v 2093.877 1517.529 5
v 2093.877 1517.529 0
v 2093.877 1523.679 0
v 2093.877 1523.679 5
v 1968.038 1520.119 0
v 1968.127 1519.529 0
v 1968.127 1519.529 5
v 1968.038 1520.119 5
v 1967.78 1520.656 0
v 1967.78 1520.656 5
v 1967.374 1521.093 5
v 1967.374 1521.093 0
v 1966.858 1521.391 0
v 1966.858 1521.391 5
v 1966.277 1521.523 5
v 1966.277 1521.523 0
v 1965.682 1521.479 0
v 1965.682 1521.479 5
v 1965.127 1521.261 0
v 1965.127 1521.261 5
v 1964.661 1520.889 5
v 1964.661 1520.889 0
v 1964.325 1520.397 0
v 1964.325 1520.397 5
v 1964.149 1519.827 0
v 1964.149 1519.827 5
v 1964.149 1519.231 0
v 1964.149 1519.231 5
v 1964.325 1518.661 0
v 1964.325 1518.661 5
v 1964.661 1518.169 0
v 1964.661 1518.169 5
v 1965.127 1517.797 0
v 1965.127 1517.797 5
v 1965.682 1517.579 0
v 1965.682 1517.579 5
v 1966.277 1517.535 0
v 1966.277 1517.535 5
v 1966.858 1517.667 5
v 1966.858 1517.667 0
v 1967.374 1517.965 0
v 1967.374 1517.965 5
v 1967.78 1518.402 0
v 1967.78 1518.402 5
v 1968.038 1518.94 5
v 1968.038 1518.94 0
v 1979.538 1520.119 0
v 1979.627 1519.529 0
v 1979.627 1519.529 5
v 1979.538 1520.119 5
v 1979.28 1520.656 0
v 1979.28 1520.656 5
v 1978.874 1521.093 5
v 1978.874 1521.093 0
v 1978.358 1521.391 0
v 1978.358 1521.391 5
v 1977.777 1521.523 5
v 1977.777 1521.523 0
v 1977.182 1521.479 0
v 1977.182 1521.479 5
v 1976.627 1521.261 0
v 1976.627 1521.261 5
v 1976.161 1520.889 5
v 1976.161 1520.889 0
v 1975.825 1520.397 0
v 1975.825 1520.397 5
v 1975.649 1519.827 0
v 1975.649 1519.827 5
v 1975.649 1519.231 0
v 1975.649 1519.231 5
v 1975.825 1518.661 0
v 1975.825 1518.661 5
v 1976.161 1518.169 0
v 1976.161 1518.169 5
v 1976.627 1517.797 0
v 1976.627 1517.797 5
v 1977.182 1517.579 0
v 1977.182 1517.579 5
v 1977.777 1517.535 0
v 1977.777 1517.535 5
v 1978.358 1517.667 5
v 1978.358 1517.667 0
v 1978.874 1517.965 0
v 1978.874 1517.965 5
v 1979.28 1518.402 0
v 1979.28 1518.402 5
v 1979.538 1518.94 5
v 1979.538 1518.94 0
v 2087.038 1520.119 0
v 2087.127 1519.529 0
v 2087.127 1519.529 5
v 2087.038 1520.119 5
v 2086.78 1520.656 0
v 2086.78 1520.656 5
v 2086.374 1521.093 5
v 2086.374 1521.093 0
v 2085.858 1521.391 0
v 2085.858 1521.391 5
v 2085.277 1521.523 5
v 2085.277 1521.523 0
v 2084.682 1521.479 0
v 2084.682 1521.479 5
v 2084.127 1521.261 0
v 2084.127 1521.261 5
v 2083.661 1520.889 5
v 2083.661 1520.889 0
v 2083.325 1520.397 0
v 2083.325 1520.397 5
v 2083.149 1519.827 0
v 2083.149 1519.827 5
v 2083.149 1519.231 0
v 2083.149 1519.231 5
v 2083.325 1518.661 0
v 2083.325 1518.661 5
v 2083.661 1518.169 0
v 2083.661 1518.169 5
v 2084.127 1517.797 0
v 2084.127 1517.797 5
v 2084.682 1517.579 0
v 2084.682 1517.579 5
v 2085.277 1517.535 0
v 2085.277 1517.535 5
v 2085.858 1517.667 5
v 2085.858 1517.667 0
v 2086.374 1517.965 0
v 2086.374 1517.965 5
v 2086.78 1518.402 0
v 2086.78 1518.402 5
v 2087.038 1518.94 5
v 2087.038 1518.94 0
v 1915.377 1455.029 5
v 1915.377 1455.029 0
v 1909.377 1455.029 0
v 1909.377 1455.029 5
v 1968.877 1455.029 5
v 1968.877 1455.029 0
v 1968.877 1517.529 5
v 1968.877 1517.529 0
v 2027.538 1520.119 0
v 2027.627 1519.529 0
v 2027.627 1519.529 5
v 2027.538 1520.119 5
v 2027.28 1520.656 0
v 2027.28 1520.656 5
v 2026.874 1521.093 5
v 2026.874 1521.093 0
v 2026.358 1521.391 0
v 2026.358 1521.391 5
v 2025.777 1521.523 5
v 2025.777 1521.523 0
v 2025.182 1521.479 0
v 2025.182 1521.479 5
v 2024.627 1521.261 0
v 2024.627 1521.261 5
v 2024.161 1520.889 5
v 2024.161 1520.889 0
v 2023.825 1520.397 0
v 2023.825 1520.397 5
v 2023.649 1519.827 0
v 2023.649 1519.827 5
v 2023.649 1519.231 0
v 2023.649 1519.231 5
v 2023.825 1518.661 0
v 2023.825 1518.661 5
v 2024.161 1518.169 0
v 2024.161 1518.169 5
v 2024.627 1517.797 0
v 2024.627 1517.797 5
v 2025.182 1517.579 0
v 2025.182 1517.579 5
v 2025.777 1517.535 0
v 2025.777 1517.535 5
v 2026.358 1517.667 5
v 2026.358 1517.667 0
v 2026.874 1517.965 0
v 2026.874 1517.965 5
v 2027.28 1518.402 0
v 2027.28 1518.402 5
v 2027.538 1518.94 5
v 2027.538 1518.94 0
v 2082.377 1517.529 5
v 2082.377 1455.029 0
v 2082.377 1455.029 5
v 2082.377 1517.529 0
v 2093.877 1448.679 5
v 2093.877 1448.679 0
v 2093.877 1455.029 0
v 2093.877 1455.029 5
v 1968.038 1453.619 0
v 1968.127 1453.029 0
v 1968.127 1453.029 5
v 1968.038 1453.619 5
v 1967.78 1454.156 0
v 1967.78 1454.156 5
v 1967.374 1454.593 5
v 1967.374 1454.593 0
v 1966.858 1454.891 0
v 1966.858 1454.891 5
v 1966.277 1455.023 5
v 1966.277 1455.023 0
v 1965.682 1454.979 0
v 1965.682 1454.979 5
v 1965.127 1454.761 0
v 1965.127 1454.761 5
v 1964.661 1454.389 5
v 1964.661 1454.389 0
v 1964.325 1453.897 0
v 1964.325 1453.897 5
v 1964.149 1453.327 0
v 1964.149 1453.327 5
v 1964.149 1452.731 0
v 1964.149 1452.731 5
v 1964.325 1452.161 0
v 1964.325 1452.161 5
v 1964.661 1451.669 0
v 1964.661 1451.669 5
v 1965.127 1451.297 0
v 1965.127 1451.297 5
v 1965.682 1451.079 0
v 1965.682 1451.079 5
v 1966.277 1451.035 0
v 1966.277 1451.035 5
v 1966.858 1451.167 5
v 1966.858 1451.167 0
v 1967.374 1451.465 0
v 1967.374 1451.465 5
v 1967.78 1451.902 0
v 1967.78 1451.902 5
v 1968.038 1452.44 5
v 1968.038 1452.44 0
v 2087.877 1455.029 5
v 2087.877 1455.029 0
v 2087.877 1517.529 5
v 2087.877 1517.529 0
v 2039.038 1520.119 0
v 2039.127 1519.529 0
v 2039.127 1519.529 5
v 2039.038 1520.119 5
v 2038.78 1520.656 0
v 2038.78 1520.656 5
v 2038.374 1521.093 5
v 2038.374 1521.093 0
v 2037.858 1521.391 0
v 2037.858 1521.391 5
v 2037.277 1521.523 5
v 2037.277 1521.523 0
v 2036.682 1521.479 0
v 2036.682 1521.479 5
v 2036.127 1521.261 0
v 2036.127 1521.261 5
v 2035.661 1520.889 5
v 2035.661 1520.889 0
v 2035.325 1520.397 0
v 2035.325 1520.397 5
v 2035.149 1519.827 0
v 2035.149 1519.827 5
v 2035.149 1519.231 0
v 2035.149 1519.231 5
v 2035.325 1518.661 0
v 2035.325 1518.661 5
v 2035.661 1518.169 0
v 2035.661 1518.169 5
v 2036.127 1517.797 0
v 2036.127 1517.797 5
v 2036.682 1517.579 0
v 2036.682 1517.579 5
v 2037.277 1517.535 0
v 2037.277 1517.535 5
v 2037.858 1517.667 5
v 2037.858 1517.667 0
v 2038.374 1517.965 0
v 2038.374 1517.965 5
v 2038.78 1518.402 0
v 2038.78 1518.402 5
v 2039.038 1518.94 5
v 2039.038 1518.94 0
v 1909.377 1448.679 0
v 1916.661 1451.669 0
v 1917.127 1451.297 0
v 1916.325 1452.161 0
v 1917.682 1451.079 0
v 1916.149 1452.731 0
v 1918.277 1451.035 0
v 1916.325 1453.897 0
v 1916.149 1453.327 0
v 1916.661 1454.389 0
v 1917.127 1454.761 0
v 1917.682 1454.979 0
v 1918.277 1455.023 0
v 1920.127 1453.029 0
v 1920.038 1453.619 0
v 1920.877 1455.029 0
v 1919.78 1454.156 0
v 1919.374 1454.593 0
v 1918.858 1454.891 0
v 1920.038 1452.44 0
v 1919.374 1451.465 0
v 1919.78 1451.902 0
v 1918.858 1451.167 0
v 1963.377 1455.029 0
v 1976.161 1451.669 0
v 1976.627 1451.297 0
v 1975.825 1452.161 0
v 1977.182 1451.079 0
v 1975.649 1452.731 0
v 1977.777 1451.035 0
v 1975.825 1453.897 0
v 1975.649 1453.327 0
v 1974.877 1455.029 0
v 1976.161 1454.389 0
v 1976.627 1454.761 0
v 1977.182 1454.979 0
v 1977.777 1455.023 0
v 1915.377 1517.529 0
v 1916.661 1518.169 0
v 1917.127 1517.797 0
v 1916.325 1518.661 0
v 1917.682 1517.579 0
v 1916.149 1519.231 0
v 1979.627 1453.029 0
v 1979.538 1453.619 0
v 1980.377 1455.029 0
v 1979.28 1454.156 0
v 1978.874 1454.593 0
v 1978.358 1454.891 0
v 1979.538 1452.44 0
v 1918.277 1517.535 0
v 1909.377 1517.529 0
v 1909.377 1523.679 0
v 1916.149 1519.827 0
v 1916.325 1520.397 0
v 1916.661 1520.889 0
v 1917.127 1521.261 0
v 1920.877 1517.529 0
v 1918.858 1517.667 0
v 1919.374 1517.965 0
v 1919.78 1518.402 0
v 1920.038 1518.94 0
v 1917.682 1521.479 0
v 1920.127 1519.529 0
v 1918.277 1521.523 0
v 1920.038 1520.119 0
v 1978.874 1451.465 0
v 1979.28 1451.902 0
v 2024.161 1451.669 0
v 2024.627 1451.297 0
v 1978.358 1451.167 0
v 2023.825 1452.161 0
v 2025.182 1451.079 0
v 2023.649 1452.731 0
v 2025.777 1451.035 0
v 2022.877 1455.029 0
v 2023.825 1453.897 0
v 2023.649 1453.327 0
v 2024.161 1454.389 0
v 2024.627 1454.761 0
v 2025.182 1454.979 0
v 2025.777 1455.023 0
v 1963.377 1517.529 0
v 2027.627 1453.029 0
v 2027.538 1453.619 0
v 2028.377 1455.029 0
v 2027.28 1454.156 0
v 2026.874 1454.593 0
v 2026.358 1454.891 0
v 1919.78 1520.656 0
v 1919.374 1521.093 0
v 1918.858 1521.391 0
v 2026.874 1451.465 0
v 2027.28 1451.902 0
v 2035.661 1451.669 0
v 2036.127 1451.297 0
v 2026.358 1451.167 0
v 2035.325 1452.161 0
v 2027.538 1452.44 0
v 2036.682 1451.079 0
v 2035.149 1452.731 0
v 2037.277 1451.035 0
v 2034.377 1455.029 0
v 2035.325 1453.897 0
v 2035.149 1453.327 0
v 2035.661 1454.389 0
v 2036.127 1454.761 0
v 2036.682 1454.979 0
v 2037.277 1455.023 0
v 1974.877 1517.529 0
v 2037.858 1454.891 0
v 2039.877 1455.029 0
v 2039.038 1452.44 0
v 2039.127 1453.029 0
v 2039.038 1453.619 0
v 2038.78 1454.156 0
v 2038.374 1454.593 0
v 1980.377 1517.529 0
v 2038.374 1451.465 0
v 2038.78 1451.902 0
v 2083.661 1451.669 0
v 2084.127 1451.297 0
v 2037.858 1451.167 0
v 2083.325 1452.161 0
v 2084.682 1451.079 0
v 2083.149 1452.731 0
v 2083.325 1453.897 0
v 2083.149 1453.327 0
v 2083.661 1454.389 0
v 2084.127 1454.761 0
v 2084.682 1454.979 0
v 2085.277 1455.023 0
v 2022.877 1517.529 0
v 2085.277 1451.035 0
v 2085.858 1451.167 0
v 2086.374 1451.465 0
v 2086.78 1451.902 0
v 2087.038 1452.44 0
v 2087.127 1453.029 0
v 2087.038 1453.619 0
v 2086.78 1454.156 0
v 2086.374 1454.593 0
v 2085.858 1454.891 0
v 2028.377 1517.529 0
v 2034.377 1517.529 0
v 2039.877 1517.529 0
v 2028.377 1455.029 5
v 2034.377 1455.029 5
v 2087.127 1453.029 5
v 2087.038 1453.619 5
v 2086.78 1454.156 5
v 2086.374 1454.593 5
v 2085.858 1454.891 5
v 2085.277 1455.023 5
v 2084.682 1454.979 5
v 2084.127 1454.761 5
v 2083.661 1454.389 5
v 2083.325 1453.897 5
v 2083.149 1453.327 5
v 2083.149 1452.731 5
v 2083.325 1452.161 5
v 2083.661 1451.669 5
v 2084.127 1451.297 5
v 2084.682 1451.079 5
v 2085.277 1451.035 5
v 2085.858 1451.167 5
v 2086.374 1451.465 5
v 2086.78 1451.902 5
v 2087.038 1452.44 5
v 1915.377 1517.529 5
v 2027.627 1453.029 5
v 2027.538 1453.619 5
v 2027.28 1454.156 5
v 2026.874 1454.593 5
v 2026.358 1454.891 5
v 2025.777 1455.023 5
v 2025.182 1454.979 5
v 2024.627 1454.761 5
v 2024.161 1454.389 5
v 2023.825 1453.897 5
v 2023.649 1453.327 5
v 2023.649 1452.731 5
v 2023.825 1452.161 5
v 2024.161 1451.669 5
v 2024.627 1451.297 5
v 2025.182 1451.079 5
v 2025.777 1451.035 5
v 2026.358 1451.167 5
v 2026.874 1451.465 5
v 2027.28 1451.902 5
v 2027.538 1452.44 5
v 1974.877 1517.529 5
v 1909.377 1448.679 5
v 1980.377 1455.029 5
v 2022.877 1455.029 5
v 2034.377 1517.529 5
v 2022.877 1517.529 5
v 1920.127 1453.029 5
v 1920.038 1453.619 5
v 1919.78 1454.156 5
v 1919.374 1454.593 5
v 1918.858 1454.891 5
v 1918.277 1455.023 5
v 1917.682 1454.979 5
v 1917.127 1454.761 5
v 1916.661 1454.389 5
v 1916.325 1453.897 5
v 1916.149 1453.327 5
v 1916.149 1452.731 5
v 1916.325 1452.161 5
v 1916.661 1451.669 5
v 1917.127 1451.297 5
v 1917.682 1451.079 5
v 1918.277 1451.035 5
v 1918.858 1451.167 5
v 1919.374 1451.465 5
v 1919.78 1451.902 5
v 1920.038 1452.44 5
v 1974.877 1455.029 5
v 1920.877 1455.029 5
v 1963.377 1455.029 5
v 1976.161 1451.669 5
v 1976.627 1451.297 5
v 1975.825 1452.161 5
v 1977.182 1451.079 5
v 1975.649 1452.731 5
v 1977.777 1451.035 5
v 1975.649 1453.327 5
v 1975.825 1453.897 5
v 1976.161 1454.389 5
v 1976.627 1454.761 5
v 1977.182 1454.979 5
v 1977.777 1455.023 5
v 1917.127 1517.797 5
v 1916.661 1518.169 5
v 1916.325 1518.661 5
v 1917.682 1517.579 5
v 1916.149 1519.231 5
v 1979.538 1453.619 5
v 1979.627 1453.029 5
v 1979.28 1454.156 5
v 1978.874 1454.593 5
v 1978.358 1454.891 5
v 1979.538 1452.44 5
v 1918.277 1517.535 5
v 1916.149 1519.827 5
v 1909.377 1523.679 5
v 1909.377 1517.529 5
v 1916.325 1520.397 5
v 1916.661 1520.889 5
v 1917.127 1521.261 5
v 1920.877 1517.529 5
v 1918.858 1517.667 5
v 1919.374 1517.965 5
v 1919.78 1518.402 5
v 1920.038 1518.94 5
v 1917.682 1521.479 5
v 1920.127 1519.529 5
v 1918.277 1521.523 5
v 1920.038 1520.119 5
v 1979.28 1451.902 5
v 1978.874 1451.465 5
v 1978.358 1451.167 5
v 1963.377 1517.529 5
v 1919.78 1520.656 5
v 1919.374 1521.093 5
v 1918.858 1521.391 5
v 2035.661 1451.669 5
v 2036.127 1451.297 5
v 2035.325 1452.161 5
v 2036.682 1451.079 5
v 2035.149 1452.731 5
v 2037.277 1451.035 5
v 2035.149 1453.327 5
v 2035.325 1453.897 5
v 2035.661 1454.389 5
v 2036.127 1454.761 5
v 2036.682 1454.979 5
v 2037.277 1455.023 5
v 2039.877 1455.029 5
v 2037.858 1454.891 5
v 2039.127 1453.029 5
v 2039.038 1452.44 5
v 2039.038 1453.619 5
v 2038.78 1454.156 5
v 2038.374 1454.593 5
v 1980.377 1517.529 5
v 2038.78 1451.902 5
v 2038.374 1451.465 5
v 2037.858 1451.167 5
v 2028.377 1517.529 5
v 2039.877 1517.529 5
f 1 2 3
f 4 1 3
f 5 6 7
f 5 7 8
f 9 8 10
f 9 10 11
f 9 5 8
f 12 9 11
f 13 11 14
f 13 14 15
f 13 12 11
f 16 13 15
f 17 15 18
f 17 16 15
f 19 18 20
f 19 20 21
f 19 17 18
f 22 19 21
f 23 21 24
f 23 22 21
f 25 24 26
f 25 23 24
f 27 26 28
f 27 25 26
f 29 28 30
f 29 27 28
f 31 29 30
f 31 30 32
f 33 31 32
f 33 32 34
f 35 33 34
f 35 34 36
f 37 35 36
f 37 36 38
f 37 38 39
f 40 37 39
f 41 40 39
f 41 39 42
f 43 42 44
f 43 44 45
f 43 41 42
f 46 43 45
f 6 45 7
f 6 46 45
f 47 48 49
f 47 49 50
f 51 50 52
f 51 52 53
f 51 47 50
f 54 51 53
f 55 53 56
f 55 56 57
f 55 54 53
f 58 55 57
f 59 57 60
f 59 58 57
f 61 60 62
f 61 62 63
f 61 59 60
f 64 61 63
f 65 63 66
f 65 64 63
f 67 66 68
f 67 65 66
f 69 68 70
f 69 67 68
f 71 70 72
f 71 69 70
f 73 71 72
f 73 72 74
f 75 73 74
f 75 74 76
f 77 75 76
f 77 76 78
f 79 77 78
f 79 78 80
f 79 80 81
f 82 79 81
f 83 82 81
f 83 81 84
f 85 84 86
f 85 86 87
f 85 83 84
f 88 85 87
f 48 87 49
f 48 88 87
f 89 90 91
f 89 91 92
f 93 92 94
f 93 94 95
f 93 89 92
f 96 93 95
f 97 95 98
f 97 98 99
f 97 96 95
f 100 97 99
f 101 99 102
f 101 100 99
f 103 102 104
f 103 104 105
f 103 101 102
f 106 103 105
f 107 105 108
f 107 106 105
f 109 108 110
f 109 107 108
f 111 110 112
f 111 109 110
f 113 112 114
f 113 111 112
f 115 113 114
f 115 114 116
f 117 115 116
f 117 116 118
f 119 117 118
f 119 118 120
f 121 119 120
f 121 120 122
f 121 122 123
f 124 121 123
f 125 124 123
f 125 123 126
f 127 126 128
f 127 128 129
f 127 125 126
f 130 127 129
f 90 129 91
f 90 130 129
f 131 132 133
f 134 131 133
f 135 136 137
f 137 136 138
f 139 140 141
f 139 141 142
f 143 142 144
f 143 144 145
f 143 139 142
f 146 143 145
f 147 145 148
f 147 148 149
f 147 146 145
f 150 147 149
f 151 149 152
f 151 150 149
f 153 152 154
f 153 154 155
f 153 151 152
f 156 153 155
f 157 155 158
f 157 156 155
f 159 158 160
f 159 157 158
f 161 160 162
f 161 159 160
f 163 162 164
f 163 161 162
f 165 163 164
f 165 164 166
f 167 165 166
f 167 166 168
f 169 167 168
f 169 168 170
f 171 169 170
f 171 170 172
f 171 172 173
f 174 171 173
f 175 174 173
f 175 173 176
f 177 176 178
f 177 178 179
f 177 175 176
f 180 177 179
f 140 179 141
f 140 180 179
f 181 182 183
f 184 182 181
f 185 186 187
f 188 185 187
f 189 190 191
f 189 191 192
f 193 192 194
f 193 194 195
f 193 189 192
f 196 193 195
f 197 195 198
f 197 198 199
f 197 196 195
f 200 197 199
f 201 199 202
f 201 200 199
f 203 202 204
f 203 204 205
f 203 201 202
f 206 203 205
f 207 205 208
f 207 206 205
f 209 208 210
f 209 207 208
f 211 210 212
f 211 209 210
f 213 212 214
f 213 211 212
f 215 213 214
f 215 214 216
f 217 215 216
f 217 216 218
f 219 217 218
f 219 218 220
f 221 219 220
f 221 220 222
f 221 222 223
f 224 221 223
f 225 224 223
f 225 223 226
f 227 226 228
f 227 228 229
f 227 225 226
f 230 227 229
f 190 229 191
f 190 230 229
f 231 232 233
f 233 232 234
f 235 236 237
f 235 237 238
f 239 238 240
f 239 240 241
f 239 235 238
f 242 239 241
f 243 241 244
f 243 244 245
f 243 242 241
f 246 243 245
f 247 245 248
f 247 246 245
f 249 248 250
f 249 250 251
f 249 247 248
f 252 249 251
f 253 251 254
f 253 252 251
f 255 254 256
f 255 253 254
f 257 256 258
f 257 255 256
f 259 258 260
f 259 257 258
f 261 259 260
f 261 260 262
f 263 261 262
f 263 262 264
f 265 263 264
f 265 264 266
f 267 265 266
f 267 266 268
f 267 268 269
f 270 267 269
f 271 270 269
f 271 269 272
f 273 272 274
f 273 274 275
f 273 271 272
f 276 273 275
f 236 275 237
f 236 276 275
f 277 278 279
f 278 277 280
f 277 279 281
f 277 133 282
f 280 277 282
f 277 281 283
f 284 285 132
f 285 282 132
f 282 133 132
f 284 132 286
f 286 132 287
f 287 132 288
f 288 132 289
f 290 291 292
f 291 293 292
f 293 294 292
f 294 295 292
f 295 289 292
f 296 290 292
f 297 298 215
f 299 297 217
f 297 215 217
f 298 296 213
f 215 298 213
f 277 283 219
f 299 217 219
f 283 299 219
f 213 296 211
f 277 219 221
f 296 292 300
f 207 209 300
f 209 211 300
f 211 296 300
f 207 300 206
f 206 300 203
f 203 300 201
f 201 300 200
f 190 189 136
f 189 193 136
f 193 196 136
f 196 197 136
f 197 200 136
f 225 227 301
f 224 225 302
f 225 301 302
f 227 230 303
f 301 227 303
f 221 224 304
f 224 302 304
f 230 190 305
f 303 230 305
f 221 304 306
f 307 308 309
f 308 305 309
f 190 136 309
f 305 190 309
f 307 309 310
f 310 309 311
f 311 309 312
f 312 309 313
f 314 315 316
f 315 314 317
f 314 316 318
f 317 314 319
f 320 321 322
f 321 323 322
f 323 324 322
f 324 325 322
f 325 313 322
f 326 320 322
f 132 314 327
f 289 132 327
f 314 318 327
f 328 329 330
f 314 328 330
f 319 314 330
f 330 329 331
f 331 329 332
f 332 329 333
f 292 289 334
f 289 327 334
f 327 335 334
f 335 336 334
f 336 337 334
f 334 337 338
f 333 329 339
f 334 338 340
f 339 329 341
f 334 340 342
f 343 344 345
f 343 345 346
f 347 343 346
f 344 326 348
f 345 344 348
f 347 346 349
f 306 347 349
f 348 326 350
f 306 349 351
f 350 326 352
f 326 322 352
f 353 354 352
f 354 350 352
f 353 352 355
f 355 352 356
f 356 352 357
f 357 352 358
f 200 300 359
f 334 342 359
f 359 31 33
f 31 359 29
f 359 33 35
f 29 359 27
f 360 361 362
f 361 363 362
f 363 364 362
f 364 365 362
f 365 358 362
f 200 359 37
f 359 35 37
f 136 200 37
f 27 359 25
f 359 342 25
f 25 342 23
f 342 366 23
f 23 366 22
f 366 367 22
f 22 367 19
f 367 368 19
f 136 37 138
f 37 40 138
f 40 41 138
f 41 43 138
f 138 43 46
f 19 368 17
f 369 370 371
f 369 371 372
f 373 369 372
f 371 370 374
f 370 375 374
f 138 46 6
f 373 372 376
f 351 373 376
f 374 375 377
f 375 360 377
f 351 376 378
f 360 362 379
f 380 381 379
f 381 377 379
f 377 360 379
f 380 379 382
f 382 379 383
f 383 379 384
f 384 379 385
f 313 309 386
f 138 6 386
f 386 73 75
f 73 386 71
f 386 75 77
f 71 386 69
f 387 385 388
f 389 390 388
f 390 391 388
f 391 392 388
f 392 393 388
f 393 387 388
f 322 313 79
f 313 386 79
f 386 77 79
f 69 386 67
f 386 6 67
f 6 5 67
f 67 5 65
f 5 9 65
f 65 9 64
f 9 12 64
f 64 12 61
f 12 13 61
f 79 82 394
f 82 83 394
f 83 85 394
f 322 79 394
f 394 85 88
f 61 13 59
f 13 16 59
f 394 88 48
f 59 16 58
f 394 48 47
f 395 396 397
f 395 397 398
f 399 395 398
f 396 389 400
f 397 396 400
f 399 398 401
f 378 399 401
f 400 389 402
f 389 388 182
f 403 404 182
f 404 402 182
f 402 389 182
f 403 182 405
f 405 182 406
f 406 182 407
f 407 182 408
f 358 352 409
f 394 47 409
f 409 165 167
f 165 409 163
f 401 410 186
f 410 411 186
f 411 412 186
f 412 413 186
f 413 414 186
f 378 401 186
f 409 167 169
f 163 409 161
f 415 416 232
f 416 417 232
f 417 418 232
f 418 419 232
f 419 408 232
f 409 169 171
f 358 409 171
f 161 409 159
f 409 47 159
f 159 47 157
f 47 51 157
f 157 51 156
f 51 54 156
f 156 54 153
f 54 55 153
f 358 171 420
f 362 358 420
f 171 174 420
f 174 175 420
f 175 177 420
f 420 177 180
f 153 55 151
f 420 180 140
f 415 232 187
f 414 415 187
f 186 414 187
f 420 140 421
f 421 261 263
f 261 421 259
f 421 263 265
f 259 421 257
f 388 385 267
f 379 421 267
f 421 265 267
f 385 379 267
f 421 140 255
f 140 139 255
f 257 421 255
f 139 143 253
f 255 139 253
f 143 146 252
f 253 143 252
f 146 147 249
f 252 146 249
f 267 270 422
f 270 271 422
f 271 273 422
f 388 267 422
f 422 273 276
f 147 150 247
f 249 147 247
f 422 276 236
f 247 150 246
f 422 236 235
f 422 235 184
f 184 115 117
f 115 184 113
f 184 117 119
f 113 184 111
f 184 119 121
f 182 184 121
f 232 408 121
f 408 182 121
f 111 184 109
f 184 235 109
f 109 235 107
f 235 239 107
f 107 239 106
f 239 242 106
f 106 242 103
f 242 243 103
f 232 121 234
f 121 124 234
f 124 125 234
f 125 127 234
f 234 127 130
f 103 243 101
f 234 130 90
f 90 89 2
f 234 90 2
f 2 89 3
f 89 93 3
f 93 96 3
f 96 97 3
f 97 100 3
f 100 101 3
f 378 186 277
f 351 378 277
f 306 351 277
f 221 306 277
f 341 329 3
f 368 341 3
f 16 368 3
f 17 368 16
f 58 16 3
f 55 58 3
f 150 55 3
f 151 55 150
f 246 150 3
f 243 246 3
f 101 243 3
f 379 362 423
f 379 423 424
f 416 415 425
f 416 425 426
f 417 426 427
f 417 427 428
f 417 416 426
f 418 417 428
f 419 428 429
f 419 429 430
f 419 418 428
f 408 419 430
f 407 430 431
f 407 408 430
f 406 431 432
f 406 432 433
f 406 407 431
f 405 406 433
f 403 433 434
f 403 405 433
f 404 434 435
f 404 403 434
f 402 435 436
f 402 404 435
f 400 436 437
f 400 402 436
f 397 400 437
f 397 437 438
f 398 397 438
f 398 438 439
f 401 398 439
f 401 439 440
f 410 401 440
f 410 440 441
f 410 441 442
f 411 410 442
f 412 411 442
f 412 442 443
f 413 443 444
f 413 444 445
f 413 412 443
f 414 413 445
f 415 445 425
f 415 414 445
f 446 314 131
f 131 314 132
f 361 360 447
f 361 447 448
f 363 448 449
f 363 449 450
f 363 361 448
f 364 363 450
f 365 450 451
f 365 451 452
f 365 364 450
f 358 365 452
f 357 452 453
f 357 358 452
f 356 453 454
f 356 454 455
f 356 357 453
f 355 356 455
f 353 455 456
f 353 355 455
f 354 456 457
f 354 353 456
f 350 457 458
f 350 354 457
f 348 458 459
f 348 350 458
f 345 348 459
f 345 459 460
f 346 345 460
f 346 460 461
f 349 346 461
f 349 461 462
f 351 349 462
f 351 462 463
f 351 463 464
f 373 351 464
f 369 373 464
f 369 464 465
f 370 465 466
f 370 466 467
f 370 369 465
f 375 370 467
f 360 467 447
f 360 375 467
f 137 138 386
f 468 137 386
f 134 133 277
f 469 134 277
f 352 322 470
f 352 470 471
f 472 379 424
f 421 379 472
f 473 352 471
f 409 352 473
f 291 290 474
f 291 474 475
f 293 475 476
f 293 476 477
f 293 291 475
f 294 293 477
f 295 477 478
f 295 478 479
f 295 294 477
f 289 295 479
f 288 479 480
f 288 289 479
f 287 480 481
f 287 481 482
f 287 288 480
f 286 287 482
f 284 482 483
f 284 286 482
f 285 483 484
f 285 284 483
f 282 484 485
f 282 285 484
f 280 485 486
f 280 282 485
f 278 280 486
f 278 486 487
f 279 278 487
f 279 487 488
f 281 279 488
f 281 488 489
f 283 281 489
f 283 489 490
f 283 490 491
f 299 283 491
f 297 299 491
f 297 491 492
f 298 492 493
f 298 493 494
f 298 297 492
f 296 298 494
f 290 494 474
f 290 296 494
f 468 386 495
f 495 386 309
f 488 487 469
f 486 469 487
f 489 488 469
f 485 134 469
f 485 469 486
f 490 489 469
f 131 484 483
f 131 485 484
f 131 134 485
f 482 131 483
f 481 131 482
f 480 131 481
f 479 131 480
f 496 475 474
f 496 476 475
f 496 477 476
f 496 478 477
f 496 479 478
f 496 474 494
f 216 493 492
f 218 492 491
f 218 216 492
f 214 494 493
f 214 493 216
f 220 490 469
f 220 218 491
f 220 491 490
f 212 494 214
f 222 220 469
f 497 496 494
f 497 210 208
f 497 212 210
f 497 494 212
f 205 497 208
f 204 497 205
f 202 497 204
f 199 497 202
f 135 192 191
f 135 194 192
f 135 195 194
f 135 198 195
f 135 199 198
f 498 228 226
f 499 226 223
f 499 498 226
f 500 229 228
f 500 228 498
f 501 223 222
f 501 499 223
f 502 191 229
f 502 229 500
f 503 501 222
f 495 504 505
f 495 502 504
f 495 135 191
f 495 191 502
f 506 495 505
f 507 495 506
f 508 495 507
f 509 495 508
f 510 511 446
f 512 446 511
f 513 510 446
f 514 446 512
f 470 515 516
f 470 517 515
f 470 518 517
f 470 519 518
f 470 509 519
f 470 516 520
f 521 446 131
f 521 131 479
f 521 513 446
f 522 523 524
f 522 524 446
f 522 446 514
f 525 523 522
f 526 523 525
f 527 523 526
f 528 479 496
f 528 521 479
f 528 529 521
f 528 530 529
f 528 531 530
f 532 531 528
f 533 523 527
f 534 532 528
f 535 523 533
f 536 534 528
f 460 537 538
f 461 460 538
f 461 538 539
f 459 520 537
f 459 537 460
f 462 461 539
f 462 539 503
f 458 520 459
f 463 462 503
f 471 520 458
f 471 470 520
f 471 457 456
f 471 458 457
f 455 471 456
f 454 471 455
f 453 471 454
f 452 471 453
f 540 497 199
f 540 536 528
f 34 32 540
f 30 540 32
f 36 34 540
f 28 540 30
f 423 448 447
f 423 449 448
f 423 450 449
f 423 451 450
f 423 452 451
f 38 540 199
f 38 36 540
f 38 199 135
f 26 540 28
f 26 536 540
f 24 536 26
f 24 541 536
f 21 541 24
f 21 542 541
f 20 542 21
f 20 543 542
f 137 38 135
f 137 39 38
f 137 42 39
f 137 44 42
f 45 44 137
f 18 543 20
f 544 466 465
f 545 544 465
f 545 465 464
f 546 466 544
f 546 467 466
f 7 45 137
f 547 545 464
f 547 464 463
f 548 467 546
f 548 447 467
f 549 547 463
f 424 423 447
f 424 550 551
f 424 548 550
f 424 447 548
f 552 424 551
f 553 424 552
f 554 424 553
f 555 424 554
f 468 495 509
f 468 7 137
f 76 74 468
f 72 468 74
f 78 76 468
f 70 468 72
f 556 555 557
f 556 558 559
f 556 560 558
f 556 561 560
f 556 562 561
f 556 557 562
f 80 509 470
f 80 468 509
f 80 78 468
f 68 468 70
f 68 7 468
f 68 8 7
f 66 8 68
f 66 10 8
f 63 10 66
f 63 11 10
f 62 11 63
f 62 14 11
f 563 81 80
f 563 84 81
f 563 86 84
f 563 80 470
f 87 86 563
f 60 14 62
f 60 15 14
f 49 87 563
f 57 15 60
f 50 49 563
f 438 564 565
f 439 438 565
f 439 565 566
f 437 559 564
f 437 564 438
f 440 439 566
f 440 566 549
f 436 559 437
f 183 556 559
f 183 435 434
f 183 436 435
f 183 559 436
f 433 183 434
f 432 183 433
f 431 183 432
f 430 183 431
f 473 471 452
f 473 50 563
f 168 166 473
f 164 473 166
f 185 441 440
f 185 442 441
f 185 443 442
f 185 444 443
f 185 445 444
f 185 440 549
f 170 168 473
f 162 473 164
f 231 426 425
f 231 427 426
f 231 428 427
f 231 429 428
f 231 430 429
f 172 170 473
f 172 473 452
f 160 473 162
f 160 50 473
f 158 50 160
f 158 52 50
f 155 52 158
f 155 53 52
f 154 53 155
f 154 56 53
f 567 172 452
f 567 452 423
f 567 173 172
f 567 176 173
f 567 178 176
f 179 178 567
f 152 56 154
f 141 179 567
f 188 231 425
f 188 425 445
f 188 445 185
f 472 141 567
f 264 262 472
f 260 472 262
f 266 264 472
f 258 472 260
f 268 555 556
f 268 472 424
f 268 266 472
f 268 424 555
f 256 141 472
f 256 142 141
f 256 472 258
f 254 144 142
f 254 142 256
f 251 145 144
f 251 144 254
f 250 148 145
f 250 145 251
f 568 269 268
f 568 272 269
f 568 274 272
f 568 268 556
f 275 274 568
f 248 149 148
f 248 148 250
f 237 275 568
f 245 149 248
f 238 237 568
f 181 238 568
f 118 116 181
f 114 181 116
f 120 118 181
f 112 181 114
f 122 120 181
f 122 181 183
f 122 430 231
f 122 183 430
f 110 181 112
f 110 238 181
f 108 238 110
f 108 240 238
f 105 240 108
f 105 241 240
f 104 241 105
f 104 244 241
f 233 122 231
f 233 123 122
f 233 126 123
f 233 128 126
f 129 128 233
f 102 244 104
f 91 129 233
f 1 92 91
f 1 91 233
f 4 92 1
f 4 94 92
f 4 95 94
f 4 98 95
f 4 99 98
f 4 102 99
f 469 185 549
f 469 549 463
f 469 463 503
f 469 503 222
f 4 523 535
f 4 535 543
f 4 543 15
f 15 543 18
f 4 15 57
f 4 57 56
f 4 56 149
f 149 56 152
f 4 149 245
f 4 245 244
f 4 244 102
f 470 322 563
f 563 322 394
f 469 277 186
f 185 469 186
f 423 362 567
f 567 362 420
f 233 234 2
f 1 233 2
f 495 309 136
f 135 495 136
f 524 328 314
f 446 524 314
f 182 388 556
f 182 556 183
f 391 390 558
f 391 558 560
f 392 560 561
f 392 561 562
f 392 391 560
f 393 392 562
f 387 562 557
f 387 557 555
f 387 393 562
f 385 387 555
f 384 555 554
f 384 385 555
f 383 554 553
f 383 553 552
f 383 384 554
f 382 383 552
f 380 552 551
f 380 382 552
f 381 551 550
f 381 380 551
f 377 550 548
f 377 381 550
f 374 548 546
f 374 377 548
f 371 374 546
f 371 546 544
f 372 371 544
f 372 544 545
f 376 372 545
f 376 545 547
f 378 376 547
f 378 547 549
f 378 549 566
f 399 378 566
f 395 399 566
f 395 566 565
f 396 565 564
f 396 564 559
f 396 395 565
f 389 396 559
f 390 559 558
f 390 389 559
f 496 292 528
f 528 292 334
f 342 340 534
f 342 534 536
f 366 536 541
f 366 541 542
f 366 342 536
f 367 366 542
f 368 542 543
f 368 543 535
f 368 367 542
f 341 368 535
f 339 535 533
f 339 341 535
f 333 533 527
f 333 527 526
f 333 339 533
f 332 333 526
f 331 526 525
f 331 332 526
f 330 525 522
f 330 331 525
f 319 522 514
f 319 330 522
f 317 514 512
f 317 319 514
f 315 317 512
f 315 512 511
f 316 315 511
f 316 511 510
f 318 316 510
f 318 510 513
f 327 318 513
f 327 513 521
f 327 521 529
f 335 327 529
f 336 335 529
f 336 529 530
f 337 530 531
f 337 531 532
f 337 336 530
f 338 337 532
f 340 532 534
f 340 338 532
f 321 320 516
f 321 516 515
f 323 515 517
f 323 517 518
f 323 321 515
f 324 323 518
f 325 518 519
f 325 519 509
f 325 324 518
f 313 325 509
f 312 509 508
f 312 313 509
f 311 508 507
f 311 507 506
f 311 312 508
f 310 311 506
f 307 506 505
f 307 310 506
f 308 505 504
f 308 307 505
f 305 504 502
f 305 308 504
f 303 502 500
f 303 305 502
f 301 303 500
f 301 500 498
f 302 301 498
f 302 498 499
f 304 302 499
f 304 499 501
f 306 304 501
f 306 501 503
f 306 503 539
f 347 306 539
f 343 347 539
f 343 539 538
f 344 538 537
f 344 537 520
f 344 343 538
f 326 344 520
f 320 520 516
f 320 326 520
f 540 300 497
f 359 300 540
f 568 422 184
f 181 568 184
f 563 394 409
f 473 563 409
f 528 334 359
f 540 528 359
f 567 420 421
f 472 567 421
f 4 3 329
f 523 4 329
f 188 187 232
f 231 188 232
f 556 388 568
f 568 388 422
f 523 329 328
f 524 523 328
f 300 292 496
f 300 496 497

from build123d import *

# Parameters (mm, degrees)
SKETCH_1_R      = 2
SKETCH_1_W      = 42.5
SKETCH_1_H      = 62.5
SKETCH_1_W_2    = 6
EXTRUDE_1_DEPTH = 5


with BuildPart() as part:
    # 草图1 → 凸台-拉伸1 (new body)
    with BuildSketch(Plane.XY):
        Polygon((1909.377089995, 1448.678588443), (2093.877089995, 1448.678588443), (2093.877089995, 1455.029082267), (2087.877089995, 1455.029082267), (2087.877089995, 1517.529082267), (2093.877089995, 1517.529082267), (2093.877089995, 1523.678588443), (1909.377089995, 1523.678588443), (1909.377089995, 1517.529082267), (1915.377089995, 1517.529082267), (1915.377089995, 1455.029082267), (1909.377089995, 1455.029082267), align=None)
        with Locations((1918.127089995, 1453.029082267)):
            Circle(SKETCH_1_R, mode=Mode.SUBTRACT)
        with Locations((1966.127089995, 1453.029082267)):
            Circle(SKETCH_1_R, mode=Mode.SUBTRACT)
        with Locations((1977.627089995, 1453.029082267)):
            Circle(SKETCH_1_R, mode=Mode.SUBTRACT)
        with Locations((2025.627089995, 1453.029082267)):
            Circle(SKETCH_1_R, mode=Mode.SUBTRACT)
        with Locations((2037.127089995, 1453.029082267)):
            Circle(SKETCH_1_R, mode=Mode.SUBTRACT)
        with Locations((2085.127089995, 1453.029082267)):
            Circle(SKETCH_1_R, mode=Mode.SUBTRACT)
        with Locations((1942.127089995, 1486.279082267)):
            Rectangle(SKETCH_1_W, SKETCH_1_H, mode=Mode.SUBTRACT)
        Polygon((1968.877089995, 1455.029082267), (1968.877089995, 1486.279082267), (1968.877089995, 1517.529082267), (1974.877089995, 1517.529082267), (1974.877089995, 1455.029082267), align=None, mode=Mode.SUBTRACT)
        with Locations((1918.127089995, 1519.529082267)):
            Circle(SKETCH_1_R, mode=Mode.SUBTRACT)
        with Locations((1966.127089995, 1519.529082267)):
            Circle(SKETCH_1_R, mode=Mode.SUBTRACT)
        with Locations((1977.627089995, 1519.529082267)):
            Circle(SKETCH_1_R, mode=Mode.SUBTRACT)
        with Locations((2001.627089995, 1486.279082267)):
            Rectangle(SKETCH_1_W, SKETCH_1_H, mode=Mode.SUBTRACT)
        with Locations((2031.377089995, 1486.279082267)):
            Rectangle(SKETCH_1_W_2, SKETCH_1_H, mode=Mode.SUBTRACT)
        with Locations((2061.127089995, 1486.279082267)):
            Rectangle(SKETCH_1_W, SKETCH_1_H, mode=Mode.SUBTRACT)
        with Locations((2025.627089995, 1519.529082267)):
            Circle(SKETCH_1_R, mode=Mode.SUBTRACT)
        with Locations((2037.127089995, 1519.529082267)):
            Circle(SKETCH_1_R, mode=Mode.SUBTRACT)
        with Locations((2085.127089995, 1519.529082267)):
            Circle(SKETCH_1_R, mode=Mode.SUBTRACT)
    extrude(amount=EXTRUDE_1_DEPTH)


solid = part.part
